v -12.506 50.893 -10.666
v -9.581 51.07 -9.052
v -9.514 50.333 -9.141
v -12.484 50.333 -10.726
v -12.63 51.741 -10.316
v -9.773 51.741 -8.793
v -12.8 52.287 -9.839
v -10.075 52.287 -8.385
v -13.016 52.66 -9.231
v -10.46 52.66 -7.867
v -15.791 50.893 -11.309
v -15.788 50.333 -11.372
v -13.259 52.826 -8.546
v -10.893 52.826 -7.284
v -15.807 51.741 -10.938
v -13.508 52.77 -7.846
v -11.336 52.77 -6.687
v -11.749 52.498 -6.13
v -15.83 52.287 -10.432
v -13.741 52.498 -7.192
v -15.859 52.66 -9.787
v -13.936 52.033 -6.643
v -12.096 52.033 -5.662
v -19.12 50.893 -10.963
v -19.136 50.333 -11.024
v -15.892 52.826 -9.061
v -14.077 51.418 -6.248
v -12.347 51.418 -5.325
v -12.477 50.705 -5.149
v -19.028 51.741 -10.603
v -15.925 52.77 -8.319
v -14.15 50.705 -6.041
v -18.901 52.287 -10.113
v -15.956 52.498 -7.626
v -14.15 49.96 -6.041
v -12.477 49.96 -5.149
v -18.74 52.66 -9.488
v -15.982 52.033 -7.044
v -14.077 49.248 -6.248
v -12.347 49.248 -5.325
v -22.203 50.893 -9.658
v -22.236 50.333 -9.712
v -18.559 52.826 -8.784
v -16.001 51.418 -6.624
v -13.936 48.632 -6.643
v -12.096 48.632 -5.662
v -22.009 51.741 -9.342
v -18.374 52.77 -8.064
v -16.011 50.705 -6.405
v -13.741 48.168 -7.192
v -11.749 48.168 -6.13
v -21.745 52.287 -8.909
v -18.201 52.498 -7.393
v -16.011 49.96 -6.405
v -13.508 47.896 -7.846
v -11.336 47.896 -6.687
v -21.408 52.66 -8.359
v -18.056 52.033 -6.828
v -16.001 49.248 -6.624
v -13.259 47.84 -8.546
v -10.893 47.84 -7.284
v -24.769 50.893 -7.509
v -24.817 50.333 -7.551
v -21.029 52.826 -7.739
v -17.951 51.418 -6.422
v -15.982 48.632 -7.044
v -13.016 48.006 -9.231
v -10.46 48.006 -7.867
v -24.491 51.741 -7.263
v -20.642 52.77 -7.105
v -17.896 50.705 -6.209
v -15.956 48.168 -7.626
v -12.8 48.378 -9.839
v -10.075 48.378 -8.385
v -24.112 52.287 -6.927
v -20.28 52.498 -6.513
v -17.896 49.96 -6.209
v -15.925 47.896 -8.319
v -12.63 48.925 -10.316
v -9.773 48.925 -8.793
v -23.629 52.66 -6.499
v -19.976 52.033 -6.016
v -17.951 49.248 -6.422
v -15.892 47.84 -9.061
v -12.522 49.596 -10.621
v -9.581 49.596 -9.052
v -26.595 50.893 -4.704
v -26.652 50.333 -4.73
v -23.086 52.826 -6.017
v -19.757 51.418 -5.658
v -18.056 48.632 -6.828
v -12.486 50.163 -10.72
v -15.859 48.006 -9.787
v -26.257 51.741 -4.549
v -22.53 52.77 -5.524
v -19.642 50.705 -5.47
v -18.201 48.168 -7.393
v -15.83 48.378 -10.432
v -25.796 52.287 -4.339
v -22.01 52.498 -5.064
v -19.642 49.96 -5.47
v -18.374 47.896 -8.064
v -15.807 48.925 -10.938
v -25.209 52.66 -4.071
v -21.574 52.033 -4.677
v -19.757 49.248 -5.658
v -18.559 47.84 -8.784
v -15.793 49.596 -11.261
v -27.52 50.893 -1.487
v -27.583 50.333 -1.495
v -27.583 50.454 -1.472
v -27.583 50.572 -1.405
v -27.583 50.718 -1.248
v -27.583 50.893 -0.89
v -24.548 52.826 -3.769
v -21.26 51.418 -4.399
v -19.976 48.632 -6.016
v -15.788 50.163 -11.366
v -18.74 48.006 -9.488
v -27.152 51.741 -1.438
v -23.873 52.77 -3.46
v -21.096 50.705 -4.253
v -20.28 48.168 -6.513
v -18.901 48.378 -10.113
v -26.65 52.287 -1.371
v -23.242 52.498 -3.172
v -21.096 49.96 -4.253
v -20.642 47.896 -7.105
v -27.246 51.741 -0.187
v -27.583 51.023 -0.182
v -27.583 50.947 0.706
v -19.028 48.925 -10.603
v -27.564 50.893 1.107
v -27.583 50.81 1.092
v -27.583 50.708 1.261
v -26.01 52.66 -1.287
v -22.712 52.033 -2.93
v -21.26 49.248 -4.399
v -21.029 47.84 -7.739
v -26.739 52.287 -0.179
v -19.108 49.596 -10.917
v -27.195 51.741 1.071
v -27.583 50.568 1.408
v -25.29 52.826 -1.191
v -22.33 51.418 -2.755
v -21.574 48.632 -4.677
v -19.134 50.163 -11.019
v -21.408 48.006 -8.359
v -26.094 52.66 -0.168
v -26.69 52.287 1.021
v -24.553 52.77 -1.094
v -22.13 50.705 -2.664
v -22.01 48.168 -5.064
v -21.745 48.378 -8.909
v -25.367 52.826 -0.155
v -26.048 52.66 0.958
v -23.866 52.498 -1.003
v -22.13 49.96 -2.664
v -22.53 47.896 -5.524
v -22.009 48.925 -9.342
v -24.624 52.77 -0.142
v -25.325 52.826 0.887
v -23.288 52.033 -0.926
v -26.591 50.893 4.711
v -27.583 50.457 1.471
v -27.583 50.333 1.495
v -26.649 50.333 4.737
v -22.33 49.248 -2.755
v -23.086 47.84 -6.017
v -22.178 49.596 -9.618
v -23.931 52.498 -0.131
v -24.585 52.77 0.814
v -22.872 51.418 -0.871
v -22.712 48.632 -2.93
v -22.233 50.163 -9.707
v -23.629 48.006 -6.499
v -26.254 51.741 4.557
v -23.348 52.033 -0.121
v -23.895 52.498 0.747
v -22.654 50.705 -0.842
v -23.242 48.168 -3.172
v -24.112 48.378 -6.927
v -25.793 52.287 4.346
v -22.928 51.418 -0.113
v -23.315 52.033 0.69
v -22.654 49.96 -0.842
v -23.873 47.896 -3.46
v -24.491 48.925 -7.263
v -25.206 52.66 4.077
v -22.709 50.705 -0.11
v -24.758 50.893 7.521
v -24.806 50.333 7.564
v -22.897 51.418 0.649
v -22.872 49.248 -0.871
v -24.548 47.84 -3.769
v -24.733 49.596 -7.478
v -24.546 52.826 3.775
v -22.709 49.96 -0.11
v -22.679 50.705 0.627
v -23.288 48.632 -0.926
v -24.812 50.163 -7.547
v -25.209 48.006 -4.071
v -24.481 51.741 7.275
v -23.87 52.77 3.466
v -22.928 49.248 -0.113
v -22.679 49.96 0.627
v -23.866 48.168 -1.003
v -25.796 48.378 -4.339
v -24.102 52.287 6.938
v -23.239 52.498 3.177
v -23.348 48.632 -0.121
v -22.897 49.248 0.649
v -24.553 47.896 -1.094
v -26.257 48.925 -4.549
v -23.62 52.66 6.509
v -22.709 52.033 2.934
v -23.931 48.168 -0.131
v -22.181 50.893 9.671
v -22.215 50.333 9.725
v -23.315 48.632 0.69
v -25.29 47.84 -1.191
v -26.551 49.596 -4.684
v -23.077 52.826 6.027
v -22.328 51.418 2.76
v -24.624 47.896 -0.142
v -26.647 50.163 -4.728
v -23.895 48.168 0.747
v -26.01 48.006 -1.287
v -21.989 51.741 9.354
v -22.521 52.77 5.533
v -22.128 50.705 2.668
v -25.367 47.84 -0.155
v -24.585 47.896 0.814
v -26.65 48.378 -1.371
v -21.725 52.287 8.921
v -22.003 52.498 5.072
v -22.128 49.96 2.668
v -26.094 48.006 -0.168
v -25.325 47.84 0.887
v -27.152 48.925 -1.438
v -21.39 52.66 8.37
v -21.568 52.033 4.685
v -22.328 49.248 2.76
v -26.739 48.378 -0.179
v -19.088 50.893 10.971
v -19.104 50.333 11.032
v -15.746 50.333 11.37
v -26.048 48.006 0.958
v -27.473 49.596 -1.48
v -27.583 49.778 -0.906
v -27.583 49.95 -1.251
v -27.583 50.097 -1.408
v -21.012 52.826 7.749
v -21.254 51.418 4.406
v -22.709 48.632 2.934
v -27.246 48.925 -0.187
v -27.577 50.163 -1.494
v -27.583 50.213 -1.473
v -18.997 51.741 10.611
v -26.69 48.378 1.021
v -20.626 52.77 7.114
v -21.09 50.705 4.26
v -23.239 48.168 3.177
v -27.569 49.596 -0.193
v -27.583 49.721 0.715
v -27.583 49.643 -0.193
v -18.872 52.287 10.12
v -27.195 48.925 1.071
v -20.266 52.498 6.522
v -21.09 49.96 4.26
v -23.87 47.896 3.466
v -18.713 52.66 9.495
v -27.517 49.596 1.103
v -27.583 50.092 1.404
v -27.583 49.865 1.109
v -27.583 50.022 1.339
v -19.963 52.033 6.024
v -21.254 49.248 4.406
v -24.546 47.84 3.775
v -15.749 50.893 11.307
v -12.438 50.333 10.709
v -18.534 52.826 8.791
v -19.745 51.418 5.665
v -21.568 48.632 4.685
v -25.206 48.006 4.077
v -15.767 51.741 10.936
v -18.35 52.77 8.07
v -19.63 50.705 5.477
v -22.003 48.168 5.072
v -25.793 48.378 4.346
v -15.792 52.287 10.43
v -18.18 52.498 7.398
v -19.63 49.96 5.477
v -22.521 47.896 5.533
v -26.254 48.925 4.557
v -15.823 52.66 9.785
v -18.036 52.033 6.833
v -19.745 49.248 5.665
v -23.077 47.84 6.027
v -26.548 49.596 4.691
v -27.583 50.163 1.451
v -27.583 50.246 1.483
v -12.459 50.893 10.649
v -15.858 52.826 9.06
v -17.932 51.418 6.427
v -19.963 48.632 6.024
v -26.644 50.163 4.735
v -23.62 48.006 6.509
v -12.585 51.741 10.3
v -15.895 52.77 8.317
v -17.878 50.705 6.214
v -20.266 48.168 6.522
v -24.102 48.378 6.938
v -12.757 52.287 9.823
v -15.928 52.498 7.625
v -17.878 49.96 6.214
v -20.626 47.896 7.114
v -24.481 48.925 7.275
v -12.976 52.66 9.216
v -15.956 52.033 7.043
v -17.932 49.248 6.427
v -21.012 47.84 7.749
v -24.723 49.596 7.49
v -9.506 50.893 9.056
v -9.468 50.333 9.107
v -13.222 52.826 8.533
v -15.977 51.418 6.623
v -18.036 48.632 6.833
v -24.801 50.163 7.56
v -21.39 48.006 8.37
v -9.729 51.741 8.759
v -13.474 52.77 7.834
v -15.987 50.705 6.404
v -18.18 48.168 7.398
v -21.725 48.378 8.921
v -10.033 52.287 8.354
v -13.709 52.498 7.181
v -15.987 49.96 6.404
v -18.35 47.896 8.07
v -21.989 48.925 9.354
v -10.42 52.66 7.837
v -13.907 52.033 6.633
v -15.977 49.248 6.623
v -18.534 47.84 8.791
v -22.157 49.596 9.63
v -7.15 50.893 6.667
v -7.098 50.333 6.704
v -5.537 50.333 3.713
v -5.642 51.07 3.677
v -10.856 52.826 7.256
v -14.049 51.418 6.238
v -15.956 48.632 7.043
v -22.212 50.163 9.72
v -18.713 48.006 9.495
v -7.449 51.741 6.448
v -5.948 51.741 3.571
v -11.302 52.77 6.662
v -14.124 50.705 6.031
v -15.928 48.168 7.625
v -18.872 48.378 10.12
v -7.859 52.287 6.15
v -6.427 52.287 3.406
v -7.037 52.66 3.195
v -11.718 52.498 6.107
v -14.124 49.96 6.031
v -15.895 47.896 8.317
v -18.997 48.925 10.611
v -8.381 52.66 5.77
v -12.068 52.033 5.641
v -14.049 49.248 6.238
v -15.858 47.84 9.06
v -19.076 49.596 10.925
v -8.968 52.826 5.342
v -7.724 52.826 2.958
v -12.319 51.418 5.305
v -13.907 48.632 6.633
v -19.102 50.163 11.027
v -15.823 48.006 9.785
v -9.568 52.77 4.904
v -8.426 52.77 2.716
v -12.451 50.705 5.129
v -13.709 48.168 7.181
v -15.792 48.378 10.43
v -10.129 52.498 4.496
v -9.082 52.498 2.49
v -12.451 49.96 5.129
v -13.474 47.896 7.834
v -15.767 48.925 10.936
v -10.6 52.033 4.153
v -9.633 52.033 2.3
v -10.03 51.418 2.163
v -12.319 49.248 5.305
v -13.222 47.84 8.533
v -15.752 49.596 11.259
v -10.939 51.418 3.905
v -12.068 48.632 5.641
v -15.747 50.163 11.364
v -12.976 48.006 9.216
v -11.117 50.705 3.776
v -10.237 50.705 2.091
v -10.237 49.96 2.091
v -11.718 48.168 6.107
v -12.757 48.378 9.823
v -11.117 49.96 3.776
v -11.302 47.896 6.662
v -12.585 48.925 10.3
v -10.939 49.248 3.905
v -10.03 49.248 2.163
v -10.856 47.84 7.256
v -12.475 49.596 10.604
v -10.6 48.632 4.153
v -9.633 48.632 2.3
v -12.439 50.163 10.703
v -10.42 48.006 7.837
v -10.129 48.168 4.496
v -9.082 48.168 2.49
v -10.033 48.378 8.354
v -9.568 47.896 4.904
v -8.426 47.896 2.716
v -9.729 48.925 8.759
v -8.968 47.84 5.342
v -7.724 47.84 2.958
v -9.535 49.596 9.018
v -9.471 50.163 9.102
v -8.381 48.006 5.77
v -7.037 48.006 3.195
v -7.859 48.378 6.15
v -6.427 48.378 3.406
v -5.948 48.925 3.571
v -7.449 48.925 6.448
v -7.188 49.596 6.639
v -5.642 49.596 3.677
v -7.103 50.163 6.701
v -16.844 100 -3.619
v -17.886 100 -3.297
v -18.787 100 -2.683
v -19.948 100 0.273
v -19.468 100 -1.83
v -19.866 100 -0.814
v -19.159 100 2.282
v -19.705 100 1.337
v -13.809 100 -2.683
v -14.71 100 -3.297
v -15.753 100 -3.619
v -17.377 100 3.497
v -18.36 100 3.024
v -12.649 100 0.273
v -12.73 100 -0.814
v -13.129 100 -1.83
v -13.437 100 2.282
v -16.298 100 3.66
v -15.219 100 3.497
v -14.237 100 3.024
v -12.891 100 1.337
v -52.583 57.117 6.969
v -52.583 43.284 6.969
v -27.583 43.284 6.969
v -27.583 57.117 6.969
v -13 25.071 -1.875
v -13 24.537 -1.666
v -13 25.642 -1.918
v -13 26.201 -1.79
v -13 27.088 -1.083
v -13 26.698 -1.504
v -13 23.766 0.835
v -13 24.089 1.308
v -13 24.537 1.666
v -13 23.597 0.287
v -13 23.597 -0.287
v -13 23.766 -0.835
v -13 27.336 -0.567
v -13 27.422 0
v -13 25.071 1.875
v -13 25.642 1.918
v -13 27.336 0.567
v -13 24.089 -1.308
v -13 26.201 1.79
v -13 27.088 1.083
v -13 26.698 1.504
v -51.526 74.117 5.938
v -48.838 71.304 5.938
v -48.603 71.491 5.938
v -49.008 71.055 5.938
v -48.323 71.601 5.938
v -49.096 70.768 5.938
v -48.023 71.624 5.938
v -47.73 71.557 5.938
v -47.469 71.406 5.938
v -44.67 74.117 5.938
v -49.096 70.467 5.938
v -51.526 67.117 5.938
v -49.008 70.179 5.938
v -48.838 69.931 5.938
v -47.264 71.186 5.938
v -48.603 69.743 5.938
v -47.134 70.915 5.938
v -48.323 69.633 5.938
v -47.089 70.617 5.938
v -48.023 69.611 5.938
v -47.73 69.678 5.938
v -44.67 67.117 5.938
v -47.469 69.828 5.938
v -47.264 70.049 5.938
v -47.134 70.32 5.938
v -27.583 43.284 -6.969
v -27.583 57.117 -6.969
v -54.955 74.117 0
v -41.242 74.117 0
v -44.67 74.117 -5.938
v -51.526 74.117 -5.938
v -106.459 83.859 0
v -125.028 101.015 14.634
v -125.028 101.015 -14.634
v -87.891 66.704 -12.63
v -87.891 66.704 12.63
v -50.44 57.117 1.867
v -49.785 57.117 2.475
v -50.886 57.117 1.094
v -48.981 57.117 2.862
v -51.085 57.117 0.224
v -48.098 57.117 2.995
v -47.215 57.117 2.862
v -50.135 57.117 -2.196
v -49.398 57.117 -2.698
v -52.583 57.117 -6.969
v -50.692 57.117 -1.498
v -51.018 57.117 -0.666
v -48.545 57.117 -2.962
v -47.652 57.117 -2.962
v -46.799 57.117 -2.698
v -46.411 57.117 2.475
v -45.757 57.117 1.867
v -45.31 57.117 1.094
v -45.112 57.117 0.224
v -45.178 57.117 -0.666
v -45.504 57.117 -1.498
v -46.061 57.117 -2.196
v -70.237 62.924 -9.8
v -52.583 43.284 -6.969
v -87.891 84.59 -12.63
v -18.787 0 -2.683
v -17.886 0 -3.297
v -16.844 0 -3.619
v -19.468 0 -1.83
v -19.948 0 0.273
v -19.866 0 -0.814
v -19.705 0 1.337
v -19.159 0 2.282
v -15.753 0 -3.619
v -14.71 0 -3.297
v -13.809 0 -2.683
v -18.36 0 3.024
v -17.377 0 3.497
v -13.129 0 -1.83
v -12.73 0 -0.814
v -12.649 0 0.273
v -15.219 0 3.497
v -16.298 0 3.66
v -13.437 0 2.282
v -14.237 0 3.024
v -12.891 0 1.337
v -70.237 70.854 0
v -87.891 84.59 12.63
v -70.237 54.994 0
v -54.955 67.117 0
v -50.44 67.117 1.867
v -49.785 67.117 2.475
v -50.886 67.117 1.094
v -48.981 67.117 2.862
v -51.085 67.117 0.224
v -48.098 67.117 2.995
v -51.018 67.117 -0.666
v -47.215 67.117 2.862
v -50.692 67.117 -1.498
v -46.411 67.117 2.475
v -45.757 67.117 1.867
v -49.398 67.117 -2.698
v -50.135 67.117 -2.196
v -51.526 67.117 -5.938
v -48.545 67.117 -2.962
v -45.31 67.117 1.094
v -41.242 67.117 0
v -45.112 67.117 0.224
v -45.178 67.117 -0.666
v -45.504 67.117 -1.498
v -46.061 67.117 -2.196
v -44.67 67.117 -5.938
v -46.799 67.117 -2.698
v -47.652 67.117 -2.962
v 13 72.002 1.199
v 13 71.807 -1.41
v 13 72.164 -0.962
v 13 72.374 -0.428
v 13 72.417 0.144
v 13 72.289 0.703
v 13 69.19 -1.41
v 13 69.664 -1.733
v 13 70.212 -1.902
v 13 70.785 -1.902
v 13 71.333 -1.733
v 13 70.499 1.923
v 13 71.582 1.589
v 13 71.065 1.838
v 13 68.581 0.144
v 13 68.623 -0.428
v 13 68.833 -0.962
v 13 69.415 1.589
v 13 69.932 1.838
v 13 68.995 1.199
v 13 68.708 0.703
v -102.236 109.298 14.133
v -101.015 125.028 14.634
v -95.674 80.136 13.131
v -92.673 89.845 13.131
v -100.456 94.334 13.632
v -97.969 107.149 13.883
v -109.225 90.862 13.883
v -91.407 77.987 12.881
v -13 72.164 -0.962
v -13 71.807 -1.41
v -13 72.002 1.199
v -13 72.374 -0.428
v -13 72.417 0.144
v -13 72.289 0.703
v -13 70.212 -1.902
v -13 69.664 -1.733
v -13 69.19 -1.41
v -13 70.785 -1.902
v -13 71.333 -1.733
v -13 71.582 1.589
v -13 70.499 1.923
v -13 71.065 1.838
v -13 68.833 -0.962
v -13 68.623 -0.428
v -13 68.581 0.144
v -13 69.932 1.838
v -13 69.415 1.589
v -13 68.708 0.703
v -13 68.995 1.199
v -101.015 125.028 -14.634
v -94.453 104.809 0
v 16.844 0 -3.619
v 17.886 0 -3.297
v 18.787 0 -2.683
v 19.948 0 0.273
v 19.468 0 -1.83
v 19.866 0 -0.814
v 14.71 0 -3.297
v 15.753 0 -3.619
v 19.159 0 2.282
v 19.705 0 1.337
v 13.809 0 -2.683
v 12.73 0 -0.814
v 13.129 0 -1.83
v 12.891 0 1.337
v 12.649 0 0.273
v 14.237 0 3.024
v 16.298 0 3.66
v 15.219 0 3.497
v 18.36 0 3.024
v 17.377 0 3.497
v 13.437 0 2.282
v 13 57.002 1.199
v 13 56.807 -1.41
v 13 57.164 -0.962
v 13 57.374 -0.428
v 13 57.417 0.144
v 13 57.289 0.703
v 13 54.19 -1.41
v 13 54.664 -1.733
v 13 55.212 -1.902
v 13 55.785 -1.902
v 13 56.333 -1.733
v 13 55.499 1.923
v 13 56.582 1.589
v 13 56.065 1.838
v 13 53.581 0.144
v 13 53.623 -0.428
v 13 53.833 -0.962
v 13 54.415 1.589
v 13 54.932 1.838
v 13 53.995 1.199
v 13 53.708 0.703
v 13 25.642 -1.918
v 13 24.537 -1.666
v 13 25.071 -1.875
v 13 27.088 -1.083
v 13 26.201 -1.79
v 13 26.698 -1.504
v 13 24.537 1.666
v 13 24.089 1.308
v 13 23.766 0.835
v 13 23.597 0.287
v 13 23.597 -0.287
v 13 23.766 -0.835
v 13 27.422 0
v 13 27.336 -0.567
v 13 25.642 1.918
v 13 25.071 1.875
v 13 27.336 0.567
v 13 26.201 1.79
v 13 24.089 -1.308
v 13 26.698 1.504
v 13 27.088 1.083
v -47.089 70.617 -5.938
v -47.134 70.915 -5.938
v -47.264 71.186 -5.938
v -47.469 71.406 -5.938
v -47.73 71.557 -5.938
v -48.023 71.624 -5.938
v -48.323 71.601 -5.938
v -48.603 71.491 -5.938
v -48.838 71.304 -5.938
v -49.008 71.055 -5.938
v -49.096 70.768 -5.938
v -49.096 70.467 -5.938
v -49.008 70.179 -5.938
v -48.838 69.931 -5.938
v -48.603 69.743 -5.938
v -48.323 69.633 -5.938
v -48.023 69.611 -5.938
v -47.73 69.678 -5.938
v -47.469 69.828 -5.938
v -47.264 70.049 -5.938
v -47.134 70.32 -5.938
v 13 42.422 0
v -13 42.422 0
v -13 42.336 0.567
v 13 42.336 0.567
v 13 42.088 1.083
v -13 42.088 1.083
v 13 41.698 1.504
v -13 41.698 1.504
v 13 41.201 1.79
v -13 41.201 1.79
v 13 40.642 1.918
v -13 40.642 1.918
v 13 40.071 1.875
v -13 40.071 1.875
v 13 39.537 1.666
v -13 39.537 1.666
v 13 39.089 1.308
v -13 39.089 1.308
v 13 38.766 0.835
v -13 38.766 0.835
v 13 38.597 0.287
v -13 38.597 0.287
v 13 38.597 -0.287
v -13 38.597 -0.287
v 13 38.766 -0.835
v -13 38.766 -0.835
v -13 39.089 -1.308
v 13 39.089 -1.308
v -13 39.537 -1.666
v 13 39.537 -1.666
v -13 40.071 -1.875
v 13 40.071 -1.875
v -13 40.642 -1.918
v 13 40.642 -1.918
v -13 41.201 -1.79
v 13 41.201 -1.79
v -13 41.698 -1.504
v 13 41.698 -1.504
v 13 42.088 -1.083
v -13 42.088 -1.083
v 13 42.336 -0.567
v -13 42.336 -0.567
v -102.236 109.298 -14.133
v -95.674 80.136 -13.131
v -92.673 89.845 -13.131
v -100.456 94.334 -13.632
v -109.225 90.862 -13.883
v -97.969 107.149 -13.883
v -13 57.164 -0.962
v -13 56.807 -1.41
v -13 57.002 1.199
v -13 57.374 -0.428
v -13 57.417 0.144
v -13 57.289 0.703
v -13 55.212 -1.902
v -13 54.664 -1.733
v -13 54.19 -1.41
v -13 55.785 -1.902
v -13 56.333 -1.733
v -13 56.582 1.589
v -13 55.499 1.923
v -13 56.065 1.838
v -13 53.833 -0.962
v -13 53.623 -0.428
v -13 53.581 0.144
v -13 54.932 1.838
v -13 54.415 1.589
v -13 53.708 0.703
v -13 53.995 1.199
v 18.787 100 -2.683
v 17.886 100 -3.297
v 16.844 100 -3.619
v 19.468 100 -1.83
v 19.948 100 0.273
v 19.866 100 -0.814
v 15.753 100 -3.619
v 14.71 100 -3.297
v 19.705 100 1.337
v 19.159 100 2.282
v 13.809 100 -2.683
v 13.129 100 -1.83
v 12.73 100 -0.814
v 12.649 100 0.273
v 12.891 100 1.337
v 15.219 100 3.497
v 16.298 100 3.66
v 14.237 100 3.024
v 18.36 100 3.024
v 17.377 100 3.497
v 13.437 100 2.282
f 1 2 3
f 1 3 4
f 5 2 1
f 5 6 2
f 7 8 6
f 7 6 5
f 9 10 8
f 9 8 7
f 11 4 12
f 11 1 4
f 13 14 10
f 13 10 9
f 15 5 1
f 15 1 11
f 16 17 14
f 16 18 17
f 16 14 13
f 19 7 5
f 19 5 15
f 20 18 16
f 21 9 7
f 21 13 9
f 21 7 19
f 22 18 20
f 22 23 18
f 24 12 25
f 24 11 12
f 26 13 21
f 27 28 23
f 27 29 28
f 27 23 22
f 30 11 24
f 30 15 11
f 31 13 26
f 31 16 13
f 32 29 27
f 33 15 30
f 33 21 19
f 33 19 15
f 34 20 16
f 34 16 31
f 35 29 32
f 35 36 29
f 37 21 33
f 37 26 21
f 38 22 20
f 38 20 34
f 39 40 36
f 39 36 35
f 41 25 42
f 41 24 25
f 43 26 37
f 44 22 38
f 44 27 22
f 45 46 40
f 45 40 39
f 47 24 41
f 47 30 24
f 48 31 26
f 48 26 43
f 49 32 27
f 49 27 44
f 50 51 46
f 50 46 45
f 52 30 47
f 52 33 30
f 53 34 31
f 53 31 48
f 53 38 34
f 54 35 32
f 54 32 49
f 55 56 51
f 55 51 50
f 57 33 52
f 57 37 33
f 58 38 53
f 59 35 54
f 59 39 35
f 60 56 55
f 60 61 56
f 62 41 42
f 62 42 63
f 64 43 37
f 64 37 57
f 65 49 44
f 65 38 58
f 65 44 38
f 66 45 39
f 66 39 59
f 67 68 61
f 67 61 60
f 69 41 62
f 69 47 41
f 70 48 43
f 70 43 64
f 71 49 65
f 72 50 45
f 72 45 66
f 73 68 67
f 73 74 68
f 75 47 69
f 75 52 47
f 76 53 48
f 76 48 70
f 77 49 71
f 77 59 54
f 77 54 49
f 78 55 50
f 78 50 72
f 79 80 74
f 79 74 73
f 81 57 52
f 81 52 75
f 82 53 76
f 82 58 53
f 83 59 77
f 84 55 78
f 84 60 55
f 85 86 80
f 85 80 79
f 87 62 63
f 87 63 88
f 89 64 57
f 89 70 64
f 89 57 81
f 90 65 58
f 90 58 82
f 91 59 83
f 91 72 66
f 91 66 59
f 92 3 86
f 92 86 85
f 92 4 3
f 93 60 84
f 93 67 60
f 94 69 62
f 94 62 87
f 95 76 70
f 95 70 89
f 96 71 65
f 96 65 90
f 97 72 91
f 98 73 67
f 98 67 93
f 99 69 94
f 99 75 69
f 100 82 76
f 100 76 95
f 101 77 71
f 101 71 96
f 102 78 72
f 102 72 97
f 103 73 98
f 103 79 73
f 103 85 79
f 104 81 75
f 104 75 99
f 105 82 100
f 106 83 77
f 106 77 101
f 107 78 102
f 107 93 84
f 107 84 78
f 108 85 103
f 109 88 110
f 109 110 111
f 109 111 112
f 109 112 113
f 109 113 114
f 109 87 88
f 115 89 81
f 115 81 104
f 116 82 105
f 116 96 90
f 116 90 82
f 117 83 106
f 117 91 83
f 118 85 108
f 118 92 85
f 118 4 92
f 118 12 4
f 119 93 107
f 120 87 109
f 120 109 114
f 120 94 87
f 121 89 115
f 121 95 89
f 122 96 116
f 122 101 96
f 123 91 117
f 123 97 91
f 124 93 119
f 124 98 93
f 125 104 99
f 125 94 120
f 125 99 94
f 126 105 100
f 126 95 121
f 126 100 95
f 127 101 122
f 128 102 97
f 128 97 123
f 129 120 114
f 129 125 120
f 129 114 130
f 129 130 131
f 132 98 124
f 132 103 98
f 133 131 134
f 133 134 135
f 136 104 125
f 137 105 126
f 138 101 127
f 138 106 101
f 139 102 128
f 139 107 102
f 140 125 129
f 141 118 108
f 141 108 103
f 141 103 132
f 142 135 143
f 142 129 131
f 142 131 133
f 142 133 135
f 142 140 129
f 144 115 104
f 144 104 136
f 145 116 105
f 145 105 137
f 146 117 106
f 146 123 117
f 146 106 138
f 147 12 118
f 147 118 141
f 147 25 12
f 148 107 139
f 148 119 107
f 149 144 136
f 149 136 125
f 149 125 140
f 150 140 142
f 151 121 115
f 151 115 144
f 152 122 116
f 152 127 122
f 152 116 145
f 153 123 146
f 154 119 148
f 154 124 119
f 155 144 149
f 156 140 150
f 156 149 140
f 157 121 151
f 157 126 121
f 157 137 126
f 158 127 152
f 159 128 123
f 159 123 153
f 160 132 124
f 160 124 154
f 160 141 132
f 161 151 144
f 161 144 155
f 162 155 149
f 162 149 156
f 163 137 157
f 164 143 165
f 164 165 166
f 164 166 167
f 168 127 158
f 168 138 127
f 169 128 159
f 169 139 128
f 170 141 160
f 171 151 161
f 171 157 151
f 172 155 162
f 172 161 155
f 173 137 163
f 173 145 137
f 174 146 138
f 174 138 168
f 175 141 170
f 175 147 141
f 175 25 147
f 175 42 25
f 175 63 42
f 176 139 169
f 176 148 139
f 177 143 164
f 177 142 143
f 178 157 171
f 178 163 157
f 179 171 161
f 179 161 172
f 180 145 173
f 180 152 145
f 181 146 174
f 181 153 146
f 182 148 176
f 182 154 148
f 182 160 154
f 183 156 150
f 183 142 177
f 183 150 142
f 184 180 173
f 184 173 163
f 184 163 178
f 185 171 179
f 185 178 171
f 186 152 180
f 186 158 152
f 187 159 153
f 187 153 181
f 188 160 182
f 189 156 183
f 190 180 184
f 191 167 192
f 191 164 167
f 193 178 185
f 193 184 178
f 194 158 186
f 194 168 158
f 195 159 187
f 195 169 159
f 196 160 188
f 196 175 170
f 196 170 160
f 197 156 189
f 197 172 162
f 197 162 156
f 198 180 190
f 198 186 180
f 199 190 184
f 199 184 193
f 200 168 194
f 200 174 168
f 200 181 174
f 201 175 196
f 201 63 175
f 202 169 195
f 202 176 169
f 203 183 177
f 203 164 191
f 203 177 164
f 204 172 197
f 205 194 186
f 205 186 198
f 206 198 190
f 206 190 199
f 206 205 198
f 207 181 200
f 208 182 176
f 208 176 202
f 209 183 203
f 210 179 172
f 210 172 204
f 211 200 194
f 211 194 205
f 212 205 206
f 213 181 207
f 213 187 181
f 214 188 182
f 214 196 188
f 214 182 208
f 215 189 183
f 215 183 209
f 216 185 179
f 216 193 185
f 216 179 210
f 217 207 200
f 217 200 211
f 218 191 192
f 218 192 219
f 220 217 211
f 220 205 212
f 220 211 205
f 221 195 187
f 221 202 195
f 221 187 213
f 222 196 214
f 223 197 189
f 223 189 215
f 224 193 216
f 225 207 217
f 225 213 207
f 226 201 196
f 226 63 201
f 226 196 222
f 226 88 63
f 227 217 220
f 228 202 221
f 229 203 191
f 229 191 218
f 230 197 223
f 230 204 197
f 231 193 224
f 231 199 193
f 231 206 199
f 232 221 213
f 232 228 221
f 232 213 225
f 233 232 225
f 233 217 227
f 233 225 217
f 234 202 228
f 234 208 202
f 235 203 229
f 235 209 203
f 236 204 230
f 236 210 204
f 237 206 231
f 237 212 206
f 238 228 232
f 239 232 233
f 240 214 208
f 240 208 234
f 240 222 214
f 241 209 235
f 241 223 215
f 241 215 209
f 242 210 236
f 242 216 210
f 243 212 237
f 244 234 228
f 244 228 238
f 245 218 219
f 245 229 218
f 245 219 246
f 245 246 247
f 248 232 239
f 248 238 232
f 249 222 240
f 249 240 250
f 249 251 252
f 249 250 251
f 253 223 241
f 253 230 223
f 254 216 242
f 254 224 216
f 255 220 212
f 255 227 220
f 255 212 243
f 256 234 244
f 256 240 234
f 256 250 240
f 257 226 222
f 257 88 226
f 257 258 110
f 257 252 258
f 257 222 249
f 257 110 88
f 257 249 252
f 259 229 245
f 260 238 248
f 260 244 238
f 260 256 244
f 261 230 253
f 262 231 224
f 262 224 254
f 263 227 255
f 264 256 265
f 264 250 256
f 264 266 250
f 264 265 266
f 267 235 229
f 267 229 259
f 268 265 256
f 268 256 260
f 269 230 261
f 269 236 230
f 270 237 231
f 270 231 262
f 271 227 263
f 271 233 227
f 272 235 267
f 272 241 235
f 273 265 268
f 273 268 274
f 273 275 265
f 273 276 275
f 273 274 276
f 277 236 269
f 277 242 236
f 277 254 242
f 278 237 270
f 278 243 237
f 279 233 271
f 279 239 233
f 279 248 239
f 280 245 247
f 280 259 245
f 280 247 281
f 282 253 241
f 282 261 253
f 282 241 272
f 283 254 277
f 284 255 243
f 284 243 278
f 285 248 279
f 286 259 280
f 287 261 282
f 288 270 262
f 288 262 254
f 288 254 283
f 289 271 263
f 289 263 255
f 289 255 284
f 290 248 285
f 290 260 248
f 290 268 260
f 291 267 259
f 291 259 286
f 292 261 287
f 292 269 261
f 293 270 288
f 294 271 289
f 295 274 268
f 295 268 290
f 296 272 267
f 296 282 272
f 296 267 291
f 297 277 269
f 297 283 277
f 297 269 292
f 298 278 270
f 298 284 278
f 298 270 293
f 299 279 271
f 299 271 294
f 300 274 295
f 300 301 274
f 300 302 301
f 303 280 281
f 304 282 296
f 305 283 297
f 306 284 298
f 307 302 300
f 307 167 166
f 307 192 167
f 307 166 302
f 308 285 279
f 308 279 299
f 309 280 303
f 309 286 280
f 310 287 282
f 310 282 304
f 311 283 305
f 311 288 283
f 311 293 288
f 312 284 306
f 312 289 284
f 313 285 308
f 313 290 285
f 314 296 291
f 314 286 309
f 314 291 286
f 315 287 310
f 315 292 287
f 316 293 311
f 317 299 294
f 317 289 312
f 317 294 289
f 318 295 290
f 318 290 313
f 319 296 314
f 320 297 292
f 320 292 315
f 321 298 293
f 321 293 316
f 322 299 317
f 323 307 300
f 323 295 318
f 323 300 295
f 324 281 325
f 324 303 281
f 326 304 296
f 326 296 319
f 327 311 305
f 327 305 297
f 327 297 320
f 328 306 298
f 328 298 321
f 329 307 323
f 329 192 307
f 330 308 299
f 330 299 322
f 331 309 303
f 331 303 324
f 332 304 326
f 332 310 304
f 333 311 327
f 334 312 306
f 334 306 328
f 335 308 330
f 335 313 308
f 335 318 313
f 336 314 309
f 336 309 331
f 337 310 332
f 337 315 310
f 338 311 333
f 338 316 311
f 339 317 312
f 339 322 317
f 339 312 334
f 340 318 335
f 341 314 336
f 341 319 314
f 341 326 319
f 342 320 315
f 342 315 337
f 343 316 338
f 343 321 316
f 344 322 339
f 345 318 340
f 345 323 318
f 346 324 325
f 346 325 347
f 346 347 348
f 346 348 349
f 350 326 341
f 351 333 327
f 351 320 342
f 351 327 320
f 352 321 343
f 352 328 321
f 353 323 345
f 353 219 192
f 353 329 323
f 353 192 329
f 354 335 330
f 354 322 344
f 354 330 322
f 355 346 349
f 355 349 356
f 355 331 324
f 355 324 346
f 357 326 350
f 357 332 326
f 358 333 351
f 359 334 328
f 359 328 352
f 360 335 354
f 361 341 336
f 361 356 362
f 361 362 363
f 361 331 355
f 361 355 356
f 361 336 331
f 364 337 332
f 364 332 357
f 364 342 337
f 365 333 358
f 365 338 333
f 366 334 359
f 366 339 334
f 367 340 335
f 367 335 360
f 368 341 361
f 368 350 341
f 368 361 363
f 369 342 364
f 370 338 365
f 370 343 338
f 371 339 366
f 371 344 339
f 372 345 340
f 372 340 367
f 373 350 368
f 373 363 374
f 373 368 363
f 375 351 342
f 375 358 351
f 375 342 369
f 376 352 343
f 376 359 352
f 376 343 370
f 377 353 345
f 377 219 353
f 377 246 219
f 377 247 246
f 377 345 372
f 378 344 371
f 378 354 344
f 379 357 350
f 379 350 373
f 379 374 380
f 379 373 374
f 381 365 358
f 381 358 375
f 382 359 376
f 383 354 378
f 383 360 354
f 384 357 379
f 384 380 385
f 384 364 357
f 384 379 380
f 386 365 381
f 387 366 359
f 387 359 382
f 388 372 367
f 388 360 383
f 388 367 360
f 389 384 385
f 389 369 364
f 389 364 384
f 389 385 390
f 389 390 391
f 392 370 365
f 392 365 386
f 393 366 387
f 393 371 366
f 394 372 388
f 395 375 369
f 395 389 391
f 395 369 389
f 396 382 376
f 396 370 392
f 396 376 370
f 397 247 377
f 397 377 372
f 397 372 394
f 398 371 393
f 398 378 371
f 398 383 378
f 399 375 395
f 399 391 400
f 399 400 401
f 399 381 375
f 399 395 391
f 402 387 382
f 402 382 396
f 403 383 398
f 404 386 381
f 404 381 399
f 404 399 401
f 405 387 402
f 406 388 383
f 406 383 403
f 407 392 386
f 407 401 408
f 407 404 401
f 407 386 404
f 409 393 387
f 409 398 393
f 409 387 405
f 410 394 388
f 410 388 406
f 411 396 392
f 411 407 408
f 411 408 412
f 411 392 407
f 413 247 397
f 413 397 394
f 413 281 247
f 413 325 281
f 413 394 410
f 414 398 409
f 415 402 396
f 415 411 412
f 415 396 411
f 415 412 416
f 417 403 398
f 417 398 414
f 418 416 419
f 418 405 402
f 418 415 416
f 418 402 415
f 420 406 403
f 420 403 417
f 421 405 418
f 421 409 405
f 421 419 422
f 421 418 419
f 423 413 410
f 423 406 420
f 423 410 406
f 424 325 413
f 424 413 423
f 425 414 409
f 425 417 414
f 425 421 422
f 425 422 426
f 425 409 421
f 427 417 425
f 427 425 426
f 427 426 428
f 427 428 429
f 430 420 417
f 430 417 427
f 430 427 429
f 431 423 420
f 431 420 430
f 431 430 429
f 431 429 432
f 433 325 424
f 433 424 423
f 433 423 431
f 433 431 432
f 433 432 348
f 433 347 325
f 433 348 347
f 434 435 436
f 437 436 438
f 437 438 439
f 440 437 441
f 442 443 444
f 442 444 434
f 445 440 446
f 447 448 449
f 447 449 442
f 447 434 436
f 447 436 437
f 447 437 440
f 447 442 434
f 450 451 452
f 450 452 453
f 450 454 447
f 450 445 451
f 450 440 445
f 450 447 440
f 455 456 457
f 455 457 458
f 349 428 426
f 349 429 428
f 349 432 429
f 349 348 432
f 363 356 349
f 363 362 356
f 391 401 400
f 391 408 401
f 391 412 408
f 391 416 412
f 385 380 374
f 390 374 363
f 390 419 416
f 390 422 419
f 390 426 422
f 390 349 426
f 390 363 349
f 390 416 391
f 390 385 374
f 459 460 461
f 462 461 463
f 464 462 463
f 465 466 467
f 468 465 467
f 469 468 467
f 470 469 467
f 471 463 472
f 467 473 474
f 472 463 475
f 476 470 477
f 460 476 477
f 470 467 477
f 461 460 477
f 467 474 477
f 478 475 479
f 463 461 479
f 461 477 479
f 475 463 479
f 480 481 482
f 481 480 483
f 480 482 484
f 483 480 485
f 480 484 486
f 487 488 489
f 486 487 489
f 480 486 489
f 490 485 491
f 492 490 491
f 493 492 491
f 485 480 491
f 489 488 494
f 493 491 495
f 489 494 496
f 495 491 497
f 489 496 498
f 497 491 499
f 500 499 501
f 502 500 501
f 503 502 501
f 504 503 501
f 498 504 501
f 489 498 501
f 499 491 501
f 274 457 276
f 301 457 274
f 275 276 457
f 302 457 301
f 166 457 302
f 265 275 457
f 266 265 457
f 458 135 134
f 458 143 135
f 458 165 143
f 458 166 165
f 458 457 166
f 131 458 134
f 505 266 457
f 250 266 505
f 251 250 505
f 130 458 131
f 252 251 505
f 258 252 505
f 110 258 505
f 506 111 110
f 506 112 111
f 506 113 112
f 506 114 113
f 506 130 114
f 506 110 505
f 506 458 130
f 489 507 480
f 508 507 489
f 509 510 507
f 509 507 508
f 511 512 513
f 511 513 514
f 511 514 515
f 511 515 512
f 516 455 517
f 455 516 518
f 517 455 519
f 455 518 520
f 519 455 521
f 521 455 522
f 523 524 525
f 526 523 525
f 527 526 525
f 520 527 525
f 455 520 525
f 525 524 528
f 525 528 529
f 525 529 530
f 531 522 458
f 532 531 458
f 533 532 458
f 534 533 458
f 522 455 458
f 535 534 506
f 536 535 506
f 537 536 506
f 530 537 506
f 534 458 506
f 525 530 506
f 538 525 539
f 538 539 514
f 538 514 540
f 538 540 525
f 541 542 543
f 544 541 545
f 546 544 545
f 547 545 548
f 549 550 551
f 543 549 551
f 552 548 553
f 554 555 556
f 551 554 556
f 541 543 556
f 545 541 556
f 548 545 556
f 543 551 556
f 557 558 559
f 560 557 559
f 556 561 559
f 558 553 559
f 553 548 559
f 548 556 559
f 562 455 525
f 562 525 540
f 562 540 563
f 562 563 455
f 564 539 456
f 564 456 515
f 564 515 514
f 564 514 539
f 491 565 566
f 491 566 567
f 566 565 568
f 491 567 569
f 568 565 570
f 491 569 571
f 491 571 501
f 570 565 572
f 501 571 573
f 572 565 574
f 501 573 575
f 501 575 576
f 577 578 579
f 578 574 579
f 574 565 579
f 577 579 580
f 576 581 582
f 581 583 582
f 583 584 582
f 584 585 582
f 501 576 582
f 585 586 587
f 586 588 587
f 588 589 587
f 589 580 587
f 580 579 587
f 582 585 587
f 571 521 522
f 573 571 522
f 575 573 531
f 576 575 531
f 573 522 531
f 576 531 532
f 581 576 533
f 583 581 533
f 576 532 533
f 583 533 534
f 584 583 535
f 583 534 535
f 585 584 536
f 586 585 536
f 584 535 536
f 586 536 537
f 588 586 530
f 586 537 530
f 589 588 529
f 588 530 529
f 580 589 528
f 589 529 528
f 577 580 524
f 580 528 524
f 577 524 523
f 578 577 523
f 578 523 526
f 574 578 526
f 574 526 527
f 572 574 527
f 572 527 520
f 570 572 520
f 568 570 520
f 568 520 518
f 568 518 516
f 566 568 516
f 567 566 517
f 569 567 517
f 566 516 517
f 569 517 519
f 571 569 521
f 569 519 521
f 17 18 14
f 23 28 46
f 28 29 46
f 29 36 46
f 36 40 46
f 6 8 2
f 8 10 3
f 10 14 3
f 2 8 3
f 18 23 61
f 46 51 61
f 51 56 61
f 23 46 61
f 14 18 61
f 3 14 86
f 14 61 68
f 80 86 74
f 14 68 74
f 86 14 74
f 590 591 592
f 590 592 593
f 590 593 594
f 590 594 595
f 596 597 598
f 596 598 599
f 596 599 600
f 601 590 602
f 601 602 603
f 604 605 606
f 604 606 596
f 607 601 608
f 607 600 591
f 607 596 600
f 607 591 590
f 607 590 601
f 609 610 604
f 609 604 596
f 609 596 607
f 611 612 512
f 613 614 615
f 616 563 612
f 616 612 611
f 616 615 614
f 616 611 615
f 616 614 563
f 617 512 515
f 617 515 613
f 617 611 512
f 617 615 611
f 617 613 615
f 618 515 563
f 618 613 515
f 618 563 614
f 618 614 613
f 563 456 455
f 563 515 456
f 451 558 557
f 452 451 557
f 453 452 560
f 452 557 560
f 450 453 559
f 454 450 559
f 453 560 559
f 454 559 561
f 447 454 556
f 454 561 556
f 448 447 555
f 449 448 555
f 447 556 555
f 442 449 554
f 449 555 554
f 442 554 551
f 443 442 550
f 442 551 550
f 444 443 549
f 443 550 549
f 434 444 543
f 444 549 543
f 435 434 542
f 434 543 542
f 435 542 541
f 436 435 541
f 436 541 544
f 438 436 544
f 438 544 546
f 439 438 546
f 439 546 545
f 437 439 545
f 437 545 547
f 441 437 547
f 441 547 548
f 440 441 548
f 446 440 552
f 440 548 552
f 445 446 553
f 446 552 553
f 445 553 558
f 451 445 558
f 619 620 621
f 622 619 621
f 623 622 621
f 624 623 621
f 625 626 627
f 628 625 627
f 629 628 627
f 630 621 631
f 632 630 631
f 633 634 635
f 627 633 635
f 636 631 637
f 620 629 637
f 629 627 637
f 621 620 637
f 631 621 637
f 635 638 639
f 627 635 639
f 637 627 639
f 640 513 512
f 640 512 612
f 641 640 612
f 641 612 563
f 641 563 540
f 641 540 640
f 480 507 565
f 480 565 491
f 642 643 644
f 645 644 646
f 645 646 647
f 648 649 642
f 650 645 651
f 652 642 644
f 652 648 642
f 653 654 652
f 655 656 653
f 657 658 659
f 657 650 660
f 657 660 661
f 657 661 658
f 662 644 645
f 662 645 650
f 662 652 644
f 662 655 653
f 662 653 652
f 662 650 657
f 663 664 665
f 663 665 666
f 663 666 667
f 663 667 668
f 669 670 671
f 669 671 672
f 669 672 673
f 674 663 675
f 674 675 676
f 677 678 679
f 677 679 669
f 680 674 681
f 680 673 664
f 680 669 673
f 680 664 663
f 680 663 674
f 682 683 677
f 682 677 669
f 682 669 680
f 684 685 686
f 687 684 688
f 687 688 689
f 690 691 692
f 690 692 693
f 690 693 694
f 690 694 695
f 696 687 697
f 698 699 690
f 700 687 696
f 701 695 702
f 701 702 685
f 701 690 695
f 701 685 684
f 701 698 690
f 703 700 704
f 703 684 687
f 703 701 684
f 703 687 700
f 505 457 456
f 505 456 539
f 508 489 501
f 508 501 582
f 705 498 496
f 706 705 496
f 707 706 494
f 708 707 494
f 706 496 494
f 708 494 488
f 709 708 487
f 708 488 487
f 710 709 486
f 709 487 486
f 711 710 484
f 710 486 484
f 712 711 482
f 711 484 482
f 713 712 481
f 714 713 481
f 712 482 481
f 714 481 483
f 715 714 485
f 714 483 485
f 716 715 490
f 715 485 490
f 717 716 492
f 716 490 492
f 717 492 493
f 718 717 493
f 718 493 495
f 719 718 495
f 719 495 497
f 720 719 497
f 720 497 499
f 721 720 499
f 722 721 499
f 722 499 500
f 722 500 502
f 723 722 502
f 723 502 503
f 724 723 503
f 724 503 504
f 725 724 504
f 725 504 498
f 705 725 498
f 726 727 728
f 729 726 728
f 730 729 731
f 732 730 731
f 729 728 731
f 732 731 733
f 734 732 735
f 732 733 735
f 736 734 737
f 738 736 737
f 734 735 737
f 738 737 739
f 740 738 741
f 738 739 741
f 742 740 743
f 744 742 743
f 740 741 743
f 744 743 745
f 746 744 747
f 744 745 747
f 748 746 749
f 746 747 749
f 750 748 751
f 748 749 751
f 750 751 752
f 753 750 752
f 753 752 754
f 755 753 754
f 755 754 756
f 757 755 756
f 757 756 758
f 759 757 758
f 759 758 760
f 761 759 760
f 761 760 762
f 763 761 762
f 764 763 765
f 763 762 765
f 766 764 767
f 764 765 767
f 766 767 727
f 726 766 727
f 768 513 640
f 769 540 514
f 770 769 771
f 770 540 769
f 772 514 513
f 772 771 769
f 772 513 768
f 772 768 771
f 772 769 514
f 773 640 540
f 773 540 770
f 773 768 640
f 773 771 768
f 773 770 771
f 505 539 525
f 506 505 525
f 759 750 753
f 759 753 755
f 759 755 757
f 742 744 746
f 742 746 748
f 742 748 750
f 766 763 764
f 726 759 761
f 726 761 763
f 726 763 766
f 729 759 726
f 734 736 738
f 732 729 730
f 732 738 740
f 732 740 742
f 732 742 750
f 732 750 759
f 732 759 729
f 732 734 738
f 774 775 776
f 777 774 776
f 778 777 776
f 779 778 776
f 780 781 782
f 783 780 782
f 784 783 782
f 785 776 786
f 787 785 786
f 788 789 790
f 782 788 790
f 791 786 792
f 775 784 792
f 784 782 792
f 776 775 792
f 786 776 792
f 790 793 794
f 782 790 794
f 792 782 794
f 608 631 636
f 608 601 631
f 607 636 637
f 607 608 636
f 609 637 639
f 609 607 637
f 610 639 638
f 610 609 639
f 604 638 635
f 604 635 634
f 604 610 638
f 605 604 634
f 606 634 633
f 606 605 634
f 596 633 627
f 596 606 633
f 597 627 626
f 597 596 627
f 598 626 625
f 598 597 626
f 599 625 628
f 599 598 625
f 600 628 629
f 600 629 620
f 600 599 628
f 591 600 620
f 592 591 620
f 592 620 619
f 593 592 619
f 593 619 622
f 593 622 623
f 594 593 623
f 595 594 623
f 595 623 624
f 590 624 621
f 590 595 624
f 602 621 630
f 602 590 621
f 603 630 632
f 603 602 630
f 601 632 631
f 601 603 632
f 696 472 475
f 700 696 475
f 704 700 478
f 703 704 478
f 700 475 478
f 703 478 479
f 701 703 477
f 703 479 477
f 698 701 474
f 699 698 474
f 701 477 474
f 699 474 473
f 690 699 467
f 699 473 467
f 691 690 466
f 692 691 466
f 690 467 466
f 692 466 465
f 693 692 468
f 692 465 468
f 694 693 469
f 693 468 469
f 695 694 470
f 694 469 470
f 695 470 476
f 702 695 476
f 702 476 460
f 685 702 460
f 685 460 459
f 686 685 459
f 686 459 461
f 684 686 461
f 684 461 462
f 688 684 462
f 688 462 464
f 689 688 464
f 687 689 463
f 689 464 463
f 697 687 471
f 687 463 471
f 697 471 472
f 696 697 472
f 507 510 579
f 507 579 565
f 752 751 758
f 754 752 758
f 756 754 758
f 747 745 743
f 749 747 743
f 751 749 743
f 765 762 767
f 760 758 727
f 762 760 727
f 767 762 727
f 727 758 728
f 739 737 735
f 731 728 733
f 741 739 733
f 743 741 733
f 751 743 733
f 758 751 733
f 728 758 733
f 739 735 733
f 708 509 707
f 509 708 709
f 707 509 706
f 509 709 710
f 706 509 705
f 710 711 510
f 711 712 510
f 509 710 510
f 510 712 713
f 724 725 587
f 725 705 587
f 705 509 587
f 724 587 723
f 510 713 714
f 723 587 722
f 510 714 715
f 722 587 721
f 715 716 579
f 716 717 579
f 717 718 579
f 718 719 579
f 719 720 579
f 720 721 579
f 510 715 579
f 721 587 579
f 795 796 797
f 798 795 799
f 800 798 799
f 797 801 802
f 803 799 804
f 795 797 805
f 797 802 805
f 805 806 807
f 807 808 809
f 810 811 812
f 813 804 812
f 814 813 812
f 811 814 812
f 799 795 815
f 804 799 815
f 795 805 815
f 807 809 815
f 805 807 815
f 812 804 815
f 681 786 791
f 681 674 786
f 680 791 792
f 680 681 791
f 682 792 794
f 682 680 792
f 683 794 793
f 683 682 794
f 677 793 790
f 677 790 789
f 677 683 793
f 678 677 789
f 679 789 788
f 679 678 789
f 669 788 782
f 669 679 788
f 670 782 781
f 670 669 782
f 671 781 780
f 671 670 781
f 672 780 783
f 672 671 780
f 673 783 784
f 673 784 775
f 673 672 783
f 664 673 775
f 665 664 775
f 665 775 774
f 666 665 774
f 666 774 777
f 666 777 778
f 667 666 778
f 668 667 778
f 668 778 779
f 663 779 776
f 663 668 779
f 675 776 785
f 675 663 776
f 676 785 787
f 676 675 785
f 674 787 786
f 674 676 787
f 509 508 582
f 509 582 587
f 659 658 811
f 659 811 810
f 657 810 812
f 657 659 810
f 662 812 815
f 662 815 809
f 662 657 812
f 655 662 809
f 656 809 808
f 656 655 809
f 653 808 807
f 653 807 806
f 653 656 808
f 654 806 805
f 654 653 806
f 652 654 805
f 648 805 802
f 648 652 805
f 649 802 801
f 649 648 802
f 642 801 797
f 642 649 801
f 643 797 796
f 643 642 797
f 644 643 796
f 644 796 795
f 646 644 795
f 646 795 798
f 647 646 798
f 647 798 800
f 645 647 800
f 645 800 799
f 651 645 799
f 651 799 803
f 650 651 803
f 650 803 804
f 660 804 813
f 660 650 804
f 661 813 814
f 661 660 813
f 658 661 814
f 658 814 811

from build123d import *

# Parameters (mm, degrees)
SKETCH_1_R            = 3.659721806
EXTRUDE_1_DEPTH       = 100
SKETCH_2_R            = 1.923374245
EXTRUDE_2_DEPTH       = 13
MOVE_START            = -13
MOVE_BODY_4_OUTLINE_R = 1.923374245
MOVE_BODY_4_DEPTH     = 26
SWEEP_4_PROFILE_R     = 2.5
SKETCH_28_W           = 13.938552386
SKETCH_28_H           = 13.832988403
EXTRUDE_3_DEPTH       = 25
SKETCH_31_R           = 2.995033529
EXTRUDE_4_DEPTH       = 10
EXTRUDE_5_DEPTH       = 7
SKETCH_33_R           = 1.00927381
CUT_EXTRUDE_1_DEPTH   = 135.423062289


# Read off the part's stored shape, not the designer's step: 实体-移动/复制4
with BuildPart() as part:
    # 草图1 → 凸台-拉伸1 (new body)
    with BuildSketch(Plane(origin=(0, 0, 0), x_dir=(1, 0, 0), z_dir=(0, 1, 0))):
        with Locations(Location((-16.298188438, 0, 0), (0, 0, 270))):
            Circle(SKETCH_1_R)
    extrude(amount=EXTRUDE_1_DEPTH)


with BuildPart() as body_2:
    # 镜向5: mirrored copy
    add(part.part.mirror(Plane(origin=(0, 0, 0), x_dir=(0, 0, 1), z_dir=(1, 0, 0))))


with BuildPart() as body_3:
    # 草图2 → 凸台-拉伸2 (new, symmetric)
    with BuildSketch(Plane(origin=(0, 0, 0), x_dir=(0, 0, -1), z_dir=(1, 0, 0))):
        with Locations(Location((0, 70.49857282, 0), (0, 0, 180))):
            Circle(SKETCH_2_R)
    extrude(amount=EXTRUDE_2_DEPTH, both=True)


with BuildPart() as body_4:
    # Move Body 3: copy of body 3
    add(body_3.part.moved(Location((0, -15, 0))))


with BuildPart() as body_5:
    # Move Body 4 outline → Move Body 4 (new body)
    with BuildSketch(Plane.YZ.offset(MOVE_START)):
        with Locations((40.49857282, 0)):
            Circle(MOVE_BODY_4_OUTLINE_R)
        with Locations((25.49857282, 0)):
            Circle(MOVE_BODY_4_OUTLINE_R)
    extrude(amount=MOVE_BODY_4_DEPTH)


with BuildPart() as body_6:
    # 扫描4: sweep along a path in 草图21
    with BuildLine(Plane(origin=(0, 0, 0), x_dir=(1, 0, 0), z_dir=(0, 1, 0))) as sweep_4_path:
        ThreePointArc((-11.004253152, 7.133782197), (-24.784747158, -2.625818033), (-7.900493606, -2.89746799))
    # 扫描4 profile (on start of the path) → 扫描4 (sweep)
    with BuildSketch(Plane(origin=(-11.004253152, 0, -7.133782197), x_dir=(0.5959288997346694, 0, -0.8030372011688042), z_dir=(-0.8030372011688042, 0, -0.5959288997346694))):
        Circle(SWEEP_4_PROFILE_R)
    sweep(path=sweep_4_path.line)


with BuildPart() as body_6_1:
    # Move Body 5: moved
    add(body_6.part.moved(Location((0, 50.332827788, 0))))

    # 草图28 → 凸台-拉伸3 (add)
    with BuildSketch(Plane(origin=(-27.583086443, 0, 0), x_dir=(0, 0, -1), z_dir=(1, 0, 0))):
        with Locations((0, 50.200659589)):
            Rectangle(SKETCH_28_W, SKETCH_28_H)
    extrude(amount=-EXTRUDE_3_DEPTH)

    # 草图30 → 放样2 section 0
    with BuildSketch(Plane.ZY.offset(52.583086443)):
        with BuildLine():
            Line((-6.969276193, 43.284165387), (6.969276193, 43.284165387))
            Line((6.969276193, 43.284165387), (6.969276193, 57.11715379))
            Line((6.969276193, 57.11715379), (-6.969276193, 57.11715379))
            Line((-6.969276193, 57.11715379), (-6.969276193, 43.284165387))
        make_face()
    # 草图29 → 放样2 section 1
    with BuildSketch(Plane(origin=(-87.890844006, 0, 0), x_dir=(0, 0, -1), z_dir=(1, 0, 0))):
        with BuildLine():
            Line((12.629992537, 84.590242061), (-12.629992537, 84.590242061))
            Line((-12.629992537, 84.590242061), (-12.629992537, 66.703532711))
            Line((-12.629992537, 66.703532711), (12.629992537, 66.703532711))
            Line((12.629992537, 66.703532711), (12.629992537, 84.590242061))
        make_face()
    loft()

    # 草图31 → 凸台-拉伸4 (add)
    with BuildSketch(Plane(origin=(0, 57.11715379, 0), x_dir=(1, 0, 0), z_dir=(0, 1, 0))):
        with Locations(Location((-48.098235143, 0, 0), (0, 0, 270))):
            Circle(SKETCH_31_R)
    extrude(amount=EXTRUDE_4_DEPTH)

    # 草图32 → 凸台-拉伸5 (add)
    with BuildSketch(Plane(origin=(0, 67.11715379, 0), x_dir=(1, 0, 0), z_dir=(0, 1, 0))):
        Polygon((-41.241970146, 0), (-44.670102644, 5.937699663), (-51.526367642, 5.937699663), (-54.95450014, 0), (-51.526367642, -5.937699663), (-44.670102644, -5.937699663), align=None)
    extrude(amount=EXTRUDE_5_DEPTH)

    # 草图33 → 切除-拉伸1 (cut, through all)
    with BuildSketch(Plane.XY.offset(5.937699663)):
        with Locations((-48.098235143, 70.61715379)):
            Circle(SKETCH_33_R)
    extrude(amount=-CUT_EXTRUDE_1_DEPTH, mode=Mode.SUBTRACT)

    # 草图36 → 放样7 section 0
    with BuildSketch(Plane(origin=(-113.021219596, 113.021219596, 0), x_dir=(0.7071067811865477, 0.7071067811865475, 0), z_dir=(-0.7071067811865475, 0.7071067811865477, 0))):
        with BuildLine():
            Line((-16.980025472, 14.6341009), (16.980025472, 14.6341009))
            Line((16.980025472, 14.6341009), (16.980025472, -14.6341009))
            Line((16.980025472, -14.6341009), (-16.980025472, -14.6341009))
            Line((-16.980025472, -14.6341009), (-16.980025472, 14.6341009))
        make_face()
    # 草图35 → 放样7 section 1
    with BuildSketch(Plane.ZY.offset(87.890844006)):
        with BuildLine():
            Line((-12.629992537, 66.703532711), (12.629992537, 66.703532711))
            Line((12.629992537, 66.703532711), (12.629992537, 84.590242061))
            Line((12.629992537, 84.590242061), (-12.629992537, 84.590242061))
            Line((-12.629992537, 84.590242061), (-12.629992537, 66.703532711))
        make_face()
    loft()


solid = Compound([part.part, body_2.part, body_3.part, body_4.part, body_5.part, body_6_1.part])
